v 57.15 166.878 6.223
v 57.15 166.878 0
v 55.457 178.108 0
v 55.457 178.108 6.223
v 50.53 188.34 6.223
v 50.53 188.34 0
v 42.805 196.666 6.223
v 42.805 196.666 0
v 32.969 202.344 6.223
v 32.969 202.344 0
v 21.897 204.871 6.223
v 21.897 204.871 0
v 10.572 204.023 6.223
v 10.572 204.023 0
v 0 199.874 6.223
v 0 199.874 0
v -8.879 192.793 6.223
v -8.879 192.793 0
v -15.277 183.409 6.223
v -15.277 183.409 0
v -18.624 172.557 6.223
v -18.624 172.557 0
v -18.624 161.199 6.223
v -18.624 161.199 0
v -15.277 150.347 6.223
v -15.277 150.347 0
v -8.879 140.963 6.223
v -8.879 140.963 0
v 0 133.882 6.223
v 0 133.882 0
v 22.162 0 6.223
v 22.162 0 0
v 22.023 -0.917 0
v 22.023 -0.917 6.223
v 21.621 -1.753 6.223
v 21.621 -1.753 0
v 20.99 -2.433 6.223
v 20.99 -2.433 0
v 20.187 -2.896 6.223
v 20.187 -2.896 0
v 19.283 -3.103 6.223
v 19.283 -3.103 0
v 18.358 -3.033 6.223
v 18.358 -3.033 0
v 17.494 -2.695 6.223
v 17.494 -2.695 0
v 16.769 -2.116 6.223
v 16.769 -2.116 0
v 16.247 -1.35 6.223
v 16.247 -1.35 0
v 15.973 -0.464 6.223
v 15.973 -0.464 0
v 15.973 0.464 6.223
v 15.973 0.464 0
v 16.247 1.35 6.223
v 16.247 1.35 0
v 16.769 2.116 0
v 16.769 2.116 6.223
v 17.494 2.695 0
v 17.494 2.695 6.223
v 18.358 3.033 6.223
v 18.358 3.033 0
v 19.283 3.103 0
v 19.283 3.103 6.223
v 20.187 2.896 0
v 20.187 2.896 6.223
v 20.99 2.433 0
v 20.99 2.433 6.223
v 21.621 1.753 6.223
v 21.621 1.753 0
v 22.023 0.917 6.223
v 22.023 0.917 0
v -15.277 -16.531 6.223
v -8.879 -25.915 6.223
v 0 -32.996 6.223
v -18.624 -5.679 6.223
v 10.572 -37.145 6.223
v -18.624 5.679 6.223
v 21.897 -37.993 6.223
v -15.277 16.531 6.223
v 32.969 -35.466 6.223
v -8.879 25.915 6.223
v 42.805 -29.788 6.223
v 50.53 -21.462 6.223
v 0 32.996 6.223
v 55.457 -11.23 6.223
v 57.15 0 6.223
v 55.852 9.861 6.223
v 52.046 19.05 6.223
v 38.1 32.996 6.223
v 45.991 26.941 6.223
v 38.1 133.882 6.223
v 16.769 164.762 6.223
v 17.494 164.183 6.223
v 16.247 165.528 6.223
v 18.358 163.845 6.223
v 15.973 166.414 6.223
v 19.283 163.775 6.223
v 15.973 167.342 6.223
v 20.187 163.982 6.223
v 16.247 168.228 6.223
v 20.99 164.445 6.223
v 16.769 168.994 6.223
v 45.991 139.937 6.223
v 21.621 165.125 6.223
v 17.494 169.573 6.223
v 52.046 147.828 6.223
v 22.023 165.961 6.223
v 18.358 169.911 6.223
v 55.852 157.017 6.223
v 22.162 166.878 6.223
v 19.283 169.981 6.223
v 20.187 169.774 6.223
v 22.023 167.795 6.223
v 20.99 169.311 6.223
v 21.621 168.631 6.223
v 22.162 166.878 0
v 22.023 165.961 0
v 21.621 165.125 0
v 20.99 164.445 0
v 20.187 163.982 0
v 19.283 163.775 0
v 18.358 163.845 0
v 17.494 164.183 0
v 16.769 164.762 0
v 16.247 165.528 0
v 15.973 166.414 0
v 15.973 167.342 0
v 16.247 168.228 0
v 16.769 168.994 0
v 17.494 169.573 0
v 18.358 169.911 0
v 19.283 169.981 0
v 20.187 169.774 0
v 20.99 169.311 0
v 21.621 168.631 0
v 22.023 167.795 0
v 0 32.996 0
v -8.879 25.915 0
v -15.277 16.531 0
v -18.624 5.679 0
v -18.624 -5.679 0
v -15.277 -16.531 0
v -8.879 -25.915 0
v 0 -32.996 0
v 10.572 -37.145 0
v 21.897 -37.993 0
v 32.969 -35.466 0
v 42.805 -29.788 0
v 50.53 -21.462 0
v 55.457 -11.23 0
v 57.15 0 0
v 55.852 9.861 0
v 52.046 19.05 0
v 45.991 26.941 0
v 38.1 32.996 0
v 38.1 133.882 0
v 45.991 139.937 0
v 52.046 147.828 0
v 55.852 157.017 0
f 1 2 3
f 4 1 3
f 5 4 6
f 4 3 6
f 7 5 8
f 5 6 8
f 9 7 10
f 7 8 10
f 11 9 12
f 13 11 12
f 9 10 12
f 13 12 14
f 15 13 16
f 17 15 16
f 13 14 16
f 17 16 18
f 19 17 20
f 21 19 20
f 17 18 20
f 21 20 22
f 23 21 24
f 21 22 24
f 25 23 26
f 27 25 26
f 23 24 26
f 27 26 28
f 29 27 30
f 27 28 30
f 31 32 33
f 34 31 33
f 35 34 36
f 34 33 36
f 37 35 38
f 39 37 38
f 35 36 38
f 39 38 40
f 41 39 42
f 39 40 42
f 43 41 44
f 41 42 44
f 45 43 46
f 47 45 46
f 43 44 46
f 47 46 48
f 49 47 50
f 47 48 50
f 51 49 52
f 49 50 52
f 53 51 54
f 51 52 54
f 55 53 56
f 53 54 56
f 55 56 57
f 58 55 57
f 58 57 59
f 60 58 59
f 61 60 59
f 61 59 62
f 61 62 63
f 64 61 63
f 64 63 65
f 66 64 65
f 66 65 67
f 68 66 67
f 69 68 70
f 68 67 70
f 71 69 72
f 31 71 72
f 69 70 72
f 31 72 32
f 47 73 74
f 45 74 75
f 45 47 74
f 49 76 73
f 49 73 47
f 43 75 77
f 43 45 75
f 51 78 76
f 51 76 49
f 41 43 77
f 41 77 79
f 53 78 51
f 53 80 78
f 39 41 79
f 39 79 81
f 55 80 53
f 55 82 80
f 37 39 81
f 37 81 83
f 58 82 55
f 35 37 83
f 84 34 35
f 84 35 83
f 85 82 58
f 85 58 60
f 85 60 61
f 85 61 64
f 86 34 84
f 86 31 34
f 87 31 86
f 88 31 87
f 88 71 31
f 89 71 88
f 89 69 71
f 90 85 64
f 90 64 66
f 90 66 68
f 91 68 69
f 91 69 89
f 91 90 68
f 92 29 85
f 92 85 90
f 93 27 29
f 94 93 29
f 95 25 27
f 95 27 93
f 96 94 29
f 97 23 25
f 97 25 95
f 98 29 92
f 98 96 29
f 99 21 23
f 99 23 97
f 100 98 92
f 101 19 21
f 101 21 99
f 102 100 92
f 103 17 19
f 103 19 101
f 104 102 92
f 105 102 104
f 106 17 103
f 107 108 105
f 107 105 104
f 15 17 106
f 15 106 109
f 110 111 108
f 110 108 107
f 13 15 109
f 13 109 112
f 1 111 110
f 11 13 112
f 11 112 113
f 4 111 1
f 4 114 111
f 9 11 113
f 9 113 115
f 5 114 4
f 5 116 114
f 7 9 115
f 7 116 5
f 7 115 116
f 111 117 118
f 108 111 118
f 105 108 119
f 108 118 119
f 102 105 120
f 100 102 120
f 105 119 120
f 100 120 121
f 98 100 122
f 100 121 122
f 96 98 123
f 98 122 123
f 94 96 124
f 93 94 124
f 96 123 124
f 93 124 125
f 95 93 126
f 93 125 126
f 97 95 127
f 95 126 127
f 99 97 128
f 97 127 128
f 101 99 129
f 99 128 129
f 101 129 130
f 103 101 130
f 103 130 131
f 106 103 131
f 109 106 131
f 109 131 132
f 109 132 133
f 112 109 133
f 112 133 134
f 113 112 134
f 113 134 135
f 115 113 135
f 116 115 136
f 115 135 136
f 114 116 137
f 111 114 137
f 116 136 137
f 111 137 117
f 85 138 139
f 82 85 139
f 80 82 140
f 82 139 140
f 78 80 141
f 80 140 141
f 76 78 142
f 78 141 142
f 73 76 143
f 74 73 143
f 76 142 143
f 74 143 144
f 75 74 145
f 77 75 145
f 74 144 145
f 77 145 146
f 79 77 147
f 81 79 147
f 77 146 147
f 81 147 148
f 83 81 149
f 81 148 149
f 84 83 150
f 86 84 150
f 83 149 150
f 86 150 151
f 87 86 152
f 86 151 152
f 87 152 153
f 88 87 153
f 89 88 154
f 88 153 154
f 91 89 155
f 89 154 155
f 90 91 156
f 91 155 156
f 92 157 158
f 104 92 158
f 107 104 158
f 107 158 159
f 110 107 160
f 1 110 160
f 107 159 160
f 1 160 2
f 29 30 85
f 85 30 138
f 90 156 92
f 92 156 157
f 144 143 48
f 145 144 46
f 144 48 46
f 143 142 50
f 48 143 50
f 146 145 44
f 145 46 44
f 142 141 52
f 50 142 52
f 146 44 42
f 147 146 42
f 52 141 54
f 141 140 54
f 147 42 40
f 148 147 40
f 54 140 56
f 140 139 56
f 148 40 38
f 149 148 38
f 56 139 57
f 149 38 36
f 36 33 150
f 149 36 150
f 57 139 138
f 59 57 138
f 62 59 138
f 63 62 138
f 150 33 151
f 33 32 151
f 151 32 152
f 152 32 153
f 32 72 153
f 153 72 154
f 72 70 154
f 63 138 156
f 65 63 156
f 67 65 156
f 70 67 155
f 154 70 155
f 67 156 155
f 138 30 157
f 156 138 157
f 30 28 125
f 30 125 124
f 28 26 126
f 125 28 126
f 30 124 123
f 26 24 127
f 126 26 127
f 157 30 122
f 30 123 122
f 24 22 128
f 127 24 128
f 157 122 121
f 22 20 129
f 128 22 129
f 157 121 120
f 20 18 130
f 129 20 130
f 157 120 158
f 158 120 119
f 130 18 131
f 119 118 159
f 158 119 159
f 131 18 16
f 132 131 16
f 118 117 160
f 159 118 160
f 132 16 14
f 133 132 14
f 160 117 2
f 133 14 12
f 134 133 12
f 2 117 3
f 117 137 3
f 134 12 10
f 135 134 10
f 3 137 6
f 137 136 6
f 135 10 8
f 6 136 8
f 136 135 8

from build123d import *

# Parameters (mm, degrees)
BOSS_EXTRUDE1_DEPTH = 6.223


with BuildPart() as part:
    # Sketch1 → Boss-Extrude1 (new body)
    with BuildSketch(Plane.XY):
        with BuildLine():
            ThreePointArc((0, 133.882432116), (19.05, 128.778), (38.1, 133.882432116))
            Line((38.1, 133.882432116), (38.1, 166.878))
            Line((38.1, 166.878), (22.1615, 166.878))
            ThreePointArc((22.1615, 166.878), (19.05, 163.7665), (15.9385, 166.878))
            Line((15.9385, 166.878), (0, 166.878))
            Line((0, 166.878), (0, 133.882432116))
        make_face()
        with BuildLine():
            Line((38.1, 166.878), (38.1, 133.882432116))
            ThreePointArc((38.1, 133.882432116), (52.045567884, 147.828), (57.15, 166.878))
            ThreePointArc((57.15, 166.878), (0, 199.873567884), (0, 133.882432116))
            Line((0, 133.882432116), (0, 166.878))
            Line((0, 166.878), (15.9385, 166.878))
            ThreePointArc((15.9385, 166.878), (19.05, 169.9895), (22.1615, 166.878))
            Line((22.1615, 166.878), (38.1, 166.878))
        make_face()
        with BuildLine():
            ThreePointArc((0, 32.995567884), (19.05, 38.1), (38.1, 32.995567884))
            Line((38.1, 32.995567884), (38.1, 133.882432116))
            ThreePointArc((38.1, 133.882432116), (19.05, 128.778), (0, 133.882432116))
            Line((0, 133.882432116), (0, 32.995567884))
        make_face()
        with BuildLine():
            ThreePointArc((15.9385, 0), (19.05, 3.1115), (22.1615, 0))
            Line((22.1615, 0), (38.1, 0))
            Line((38.1, 0), (38.1, 32.995567884))
            ThreePointArc((38.1, 32.995567884), (19.05, 38.1), (0, 32.995567884))
            Line((0, 32.995567884), (0, 0))
            Line((0, 0), (15.9385, 0))
        make_face()
        with BuildLine():
            Line((38.1, 0), (22.1615, 0))
            ThreePointArc((22.1615, 0), (19.05, -3.1115), (15.9385, 0))
            Line((15.9385, 0), (0, 0))
            Line((0, 0), (0, 32.995567884))
            ThreePointArc((0, 32.995567884), (0, -32.995567884), (57.15, 0))
            ThreePointArc((57.15, 0), (52.045567884, 19.05), (38.1, 32.995567884))
            Line((38.1, 32.995567884), (38.1, 0))
        make_face()
    extrude(amount=BOSS_EXTRUDE1_DEPTH)


solid = part.part
